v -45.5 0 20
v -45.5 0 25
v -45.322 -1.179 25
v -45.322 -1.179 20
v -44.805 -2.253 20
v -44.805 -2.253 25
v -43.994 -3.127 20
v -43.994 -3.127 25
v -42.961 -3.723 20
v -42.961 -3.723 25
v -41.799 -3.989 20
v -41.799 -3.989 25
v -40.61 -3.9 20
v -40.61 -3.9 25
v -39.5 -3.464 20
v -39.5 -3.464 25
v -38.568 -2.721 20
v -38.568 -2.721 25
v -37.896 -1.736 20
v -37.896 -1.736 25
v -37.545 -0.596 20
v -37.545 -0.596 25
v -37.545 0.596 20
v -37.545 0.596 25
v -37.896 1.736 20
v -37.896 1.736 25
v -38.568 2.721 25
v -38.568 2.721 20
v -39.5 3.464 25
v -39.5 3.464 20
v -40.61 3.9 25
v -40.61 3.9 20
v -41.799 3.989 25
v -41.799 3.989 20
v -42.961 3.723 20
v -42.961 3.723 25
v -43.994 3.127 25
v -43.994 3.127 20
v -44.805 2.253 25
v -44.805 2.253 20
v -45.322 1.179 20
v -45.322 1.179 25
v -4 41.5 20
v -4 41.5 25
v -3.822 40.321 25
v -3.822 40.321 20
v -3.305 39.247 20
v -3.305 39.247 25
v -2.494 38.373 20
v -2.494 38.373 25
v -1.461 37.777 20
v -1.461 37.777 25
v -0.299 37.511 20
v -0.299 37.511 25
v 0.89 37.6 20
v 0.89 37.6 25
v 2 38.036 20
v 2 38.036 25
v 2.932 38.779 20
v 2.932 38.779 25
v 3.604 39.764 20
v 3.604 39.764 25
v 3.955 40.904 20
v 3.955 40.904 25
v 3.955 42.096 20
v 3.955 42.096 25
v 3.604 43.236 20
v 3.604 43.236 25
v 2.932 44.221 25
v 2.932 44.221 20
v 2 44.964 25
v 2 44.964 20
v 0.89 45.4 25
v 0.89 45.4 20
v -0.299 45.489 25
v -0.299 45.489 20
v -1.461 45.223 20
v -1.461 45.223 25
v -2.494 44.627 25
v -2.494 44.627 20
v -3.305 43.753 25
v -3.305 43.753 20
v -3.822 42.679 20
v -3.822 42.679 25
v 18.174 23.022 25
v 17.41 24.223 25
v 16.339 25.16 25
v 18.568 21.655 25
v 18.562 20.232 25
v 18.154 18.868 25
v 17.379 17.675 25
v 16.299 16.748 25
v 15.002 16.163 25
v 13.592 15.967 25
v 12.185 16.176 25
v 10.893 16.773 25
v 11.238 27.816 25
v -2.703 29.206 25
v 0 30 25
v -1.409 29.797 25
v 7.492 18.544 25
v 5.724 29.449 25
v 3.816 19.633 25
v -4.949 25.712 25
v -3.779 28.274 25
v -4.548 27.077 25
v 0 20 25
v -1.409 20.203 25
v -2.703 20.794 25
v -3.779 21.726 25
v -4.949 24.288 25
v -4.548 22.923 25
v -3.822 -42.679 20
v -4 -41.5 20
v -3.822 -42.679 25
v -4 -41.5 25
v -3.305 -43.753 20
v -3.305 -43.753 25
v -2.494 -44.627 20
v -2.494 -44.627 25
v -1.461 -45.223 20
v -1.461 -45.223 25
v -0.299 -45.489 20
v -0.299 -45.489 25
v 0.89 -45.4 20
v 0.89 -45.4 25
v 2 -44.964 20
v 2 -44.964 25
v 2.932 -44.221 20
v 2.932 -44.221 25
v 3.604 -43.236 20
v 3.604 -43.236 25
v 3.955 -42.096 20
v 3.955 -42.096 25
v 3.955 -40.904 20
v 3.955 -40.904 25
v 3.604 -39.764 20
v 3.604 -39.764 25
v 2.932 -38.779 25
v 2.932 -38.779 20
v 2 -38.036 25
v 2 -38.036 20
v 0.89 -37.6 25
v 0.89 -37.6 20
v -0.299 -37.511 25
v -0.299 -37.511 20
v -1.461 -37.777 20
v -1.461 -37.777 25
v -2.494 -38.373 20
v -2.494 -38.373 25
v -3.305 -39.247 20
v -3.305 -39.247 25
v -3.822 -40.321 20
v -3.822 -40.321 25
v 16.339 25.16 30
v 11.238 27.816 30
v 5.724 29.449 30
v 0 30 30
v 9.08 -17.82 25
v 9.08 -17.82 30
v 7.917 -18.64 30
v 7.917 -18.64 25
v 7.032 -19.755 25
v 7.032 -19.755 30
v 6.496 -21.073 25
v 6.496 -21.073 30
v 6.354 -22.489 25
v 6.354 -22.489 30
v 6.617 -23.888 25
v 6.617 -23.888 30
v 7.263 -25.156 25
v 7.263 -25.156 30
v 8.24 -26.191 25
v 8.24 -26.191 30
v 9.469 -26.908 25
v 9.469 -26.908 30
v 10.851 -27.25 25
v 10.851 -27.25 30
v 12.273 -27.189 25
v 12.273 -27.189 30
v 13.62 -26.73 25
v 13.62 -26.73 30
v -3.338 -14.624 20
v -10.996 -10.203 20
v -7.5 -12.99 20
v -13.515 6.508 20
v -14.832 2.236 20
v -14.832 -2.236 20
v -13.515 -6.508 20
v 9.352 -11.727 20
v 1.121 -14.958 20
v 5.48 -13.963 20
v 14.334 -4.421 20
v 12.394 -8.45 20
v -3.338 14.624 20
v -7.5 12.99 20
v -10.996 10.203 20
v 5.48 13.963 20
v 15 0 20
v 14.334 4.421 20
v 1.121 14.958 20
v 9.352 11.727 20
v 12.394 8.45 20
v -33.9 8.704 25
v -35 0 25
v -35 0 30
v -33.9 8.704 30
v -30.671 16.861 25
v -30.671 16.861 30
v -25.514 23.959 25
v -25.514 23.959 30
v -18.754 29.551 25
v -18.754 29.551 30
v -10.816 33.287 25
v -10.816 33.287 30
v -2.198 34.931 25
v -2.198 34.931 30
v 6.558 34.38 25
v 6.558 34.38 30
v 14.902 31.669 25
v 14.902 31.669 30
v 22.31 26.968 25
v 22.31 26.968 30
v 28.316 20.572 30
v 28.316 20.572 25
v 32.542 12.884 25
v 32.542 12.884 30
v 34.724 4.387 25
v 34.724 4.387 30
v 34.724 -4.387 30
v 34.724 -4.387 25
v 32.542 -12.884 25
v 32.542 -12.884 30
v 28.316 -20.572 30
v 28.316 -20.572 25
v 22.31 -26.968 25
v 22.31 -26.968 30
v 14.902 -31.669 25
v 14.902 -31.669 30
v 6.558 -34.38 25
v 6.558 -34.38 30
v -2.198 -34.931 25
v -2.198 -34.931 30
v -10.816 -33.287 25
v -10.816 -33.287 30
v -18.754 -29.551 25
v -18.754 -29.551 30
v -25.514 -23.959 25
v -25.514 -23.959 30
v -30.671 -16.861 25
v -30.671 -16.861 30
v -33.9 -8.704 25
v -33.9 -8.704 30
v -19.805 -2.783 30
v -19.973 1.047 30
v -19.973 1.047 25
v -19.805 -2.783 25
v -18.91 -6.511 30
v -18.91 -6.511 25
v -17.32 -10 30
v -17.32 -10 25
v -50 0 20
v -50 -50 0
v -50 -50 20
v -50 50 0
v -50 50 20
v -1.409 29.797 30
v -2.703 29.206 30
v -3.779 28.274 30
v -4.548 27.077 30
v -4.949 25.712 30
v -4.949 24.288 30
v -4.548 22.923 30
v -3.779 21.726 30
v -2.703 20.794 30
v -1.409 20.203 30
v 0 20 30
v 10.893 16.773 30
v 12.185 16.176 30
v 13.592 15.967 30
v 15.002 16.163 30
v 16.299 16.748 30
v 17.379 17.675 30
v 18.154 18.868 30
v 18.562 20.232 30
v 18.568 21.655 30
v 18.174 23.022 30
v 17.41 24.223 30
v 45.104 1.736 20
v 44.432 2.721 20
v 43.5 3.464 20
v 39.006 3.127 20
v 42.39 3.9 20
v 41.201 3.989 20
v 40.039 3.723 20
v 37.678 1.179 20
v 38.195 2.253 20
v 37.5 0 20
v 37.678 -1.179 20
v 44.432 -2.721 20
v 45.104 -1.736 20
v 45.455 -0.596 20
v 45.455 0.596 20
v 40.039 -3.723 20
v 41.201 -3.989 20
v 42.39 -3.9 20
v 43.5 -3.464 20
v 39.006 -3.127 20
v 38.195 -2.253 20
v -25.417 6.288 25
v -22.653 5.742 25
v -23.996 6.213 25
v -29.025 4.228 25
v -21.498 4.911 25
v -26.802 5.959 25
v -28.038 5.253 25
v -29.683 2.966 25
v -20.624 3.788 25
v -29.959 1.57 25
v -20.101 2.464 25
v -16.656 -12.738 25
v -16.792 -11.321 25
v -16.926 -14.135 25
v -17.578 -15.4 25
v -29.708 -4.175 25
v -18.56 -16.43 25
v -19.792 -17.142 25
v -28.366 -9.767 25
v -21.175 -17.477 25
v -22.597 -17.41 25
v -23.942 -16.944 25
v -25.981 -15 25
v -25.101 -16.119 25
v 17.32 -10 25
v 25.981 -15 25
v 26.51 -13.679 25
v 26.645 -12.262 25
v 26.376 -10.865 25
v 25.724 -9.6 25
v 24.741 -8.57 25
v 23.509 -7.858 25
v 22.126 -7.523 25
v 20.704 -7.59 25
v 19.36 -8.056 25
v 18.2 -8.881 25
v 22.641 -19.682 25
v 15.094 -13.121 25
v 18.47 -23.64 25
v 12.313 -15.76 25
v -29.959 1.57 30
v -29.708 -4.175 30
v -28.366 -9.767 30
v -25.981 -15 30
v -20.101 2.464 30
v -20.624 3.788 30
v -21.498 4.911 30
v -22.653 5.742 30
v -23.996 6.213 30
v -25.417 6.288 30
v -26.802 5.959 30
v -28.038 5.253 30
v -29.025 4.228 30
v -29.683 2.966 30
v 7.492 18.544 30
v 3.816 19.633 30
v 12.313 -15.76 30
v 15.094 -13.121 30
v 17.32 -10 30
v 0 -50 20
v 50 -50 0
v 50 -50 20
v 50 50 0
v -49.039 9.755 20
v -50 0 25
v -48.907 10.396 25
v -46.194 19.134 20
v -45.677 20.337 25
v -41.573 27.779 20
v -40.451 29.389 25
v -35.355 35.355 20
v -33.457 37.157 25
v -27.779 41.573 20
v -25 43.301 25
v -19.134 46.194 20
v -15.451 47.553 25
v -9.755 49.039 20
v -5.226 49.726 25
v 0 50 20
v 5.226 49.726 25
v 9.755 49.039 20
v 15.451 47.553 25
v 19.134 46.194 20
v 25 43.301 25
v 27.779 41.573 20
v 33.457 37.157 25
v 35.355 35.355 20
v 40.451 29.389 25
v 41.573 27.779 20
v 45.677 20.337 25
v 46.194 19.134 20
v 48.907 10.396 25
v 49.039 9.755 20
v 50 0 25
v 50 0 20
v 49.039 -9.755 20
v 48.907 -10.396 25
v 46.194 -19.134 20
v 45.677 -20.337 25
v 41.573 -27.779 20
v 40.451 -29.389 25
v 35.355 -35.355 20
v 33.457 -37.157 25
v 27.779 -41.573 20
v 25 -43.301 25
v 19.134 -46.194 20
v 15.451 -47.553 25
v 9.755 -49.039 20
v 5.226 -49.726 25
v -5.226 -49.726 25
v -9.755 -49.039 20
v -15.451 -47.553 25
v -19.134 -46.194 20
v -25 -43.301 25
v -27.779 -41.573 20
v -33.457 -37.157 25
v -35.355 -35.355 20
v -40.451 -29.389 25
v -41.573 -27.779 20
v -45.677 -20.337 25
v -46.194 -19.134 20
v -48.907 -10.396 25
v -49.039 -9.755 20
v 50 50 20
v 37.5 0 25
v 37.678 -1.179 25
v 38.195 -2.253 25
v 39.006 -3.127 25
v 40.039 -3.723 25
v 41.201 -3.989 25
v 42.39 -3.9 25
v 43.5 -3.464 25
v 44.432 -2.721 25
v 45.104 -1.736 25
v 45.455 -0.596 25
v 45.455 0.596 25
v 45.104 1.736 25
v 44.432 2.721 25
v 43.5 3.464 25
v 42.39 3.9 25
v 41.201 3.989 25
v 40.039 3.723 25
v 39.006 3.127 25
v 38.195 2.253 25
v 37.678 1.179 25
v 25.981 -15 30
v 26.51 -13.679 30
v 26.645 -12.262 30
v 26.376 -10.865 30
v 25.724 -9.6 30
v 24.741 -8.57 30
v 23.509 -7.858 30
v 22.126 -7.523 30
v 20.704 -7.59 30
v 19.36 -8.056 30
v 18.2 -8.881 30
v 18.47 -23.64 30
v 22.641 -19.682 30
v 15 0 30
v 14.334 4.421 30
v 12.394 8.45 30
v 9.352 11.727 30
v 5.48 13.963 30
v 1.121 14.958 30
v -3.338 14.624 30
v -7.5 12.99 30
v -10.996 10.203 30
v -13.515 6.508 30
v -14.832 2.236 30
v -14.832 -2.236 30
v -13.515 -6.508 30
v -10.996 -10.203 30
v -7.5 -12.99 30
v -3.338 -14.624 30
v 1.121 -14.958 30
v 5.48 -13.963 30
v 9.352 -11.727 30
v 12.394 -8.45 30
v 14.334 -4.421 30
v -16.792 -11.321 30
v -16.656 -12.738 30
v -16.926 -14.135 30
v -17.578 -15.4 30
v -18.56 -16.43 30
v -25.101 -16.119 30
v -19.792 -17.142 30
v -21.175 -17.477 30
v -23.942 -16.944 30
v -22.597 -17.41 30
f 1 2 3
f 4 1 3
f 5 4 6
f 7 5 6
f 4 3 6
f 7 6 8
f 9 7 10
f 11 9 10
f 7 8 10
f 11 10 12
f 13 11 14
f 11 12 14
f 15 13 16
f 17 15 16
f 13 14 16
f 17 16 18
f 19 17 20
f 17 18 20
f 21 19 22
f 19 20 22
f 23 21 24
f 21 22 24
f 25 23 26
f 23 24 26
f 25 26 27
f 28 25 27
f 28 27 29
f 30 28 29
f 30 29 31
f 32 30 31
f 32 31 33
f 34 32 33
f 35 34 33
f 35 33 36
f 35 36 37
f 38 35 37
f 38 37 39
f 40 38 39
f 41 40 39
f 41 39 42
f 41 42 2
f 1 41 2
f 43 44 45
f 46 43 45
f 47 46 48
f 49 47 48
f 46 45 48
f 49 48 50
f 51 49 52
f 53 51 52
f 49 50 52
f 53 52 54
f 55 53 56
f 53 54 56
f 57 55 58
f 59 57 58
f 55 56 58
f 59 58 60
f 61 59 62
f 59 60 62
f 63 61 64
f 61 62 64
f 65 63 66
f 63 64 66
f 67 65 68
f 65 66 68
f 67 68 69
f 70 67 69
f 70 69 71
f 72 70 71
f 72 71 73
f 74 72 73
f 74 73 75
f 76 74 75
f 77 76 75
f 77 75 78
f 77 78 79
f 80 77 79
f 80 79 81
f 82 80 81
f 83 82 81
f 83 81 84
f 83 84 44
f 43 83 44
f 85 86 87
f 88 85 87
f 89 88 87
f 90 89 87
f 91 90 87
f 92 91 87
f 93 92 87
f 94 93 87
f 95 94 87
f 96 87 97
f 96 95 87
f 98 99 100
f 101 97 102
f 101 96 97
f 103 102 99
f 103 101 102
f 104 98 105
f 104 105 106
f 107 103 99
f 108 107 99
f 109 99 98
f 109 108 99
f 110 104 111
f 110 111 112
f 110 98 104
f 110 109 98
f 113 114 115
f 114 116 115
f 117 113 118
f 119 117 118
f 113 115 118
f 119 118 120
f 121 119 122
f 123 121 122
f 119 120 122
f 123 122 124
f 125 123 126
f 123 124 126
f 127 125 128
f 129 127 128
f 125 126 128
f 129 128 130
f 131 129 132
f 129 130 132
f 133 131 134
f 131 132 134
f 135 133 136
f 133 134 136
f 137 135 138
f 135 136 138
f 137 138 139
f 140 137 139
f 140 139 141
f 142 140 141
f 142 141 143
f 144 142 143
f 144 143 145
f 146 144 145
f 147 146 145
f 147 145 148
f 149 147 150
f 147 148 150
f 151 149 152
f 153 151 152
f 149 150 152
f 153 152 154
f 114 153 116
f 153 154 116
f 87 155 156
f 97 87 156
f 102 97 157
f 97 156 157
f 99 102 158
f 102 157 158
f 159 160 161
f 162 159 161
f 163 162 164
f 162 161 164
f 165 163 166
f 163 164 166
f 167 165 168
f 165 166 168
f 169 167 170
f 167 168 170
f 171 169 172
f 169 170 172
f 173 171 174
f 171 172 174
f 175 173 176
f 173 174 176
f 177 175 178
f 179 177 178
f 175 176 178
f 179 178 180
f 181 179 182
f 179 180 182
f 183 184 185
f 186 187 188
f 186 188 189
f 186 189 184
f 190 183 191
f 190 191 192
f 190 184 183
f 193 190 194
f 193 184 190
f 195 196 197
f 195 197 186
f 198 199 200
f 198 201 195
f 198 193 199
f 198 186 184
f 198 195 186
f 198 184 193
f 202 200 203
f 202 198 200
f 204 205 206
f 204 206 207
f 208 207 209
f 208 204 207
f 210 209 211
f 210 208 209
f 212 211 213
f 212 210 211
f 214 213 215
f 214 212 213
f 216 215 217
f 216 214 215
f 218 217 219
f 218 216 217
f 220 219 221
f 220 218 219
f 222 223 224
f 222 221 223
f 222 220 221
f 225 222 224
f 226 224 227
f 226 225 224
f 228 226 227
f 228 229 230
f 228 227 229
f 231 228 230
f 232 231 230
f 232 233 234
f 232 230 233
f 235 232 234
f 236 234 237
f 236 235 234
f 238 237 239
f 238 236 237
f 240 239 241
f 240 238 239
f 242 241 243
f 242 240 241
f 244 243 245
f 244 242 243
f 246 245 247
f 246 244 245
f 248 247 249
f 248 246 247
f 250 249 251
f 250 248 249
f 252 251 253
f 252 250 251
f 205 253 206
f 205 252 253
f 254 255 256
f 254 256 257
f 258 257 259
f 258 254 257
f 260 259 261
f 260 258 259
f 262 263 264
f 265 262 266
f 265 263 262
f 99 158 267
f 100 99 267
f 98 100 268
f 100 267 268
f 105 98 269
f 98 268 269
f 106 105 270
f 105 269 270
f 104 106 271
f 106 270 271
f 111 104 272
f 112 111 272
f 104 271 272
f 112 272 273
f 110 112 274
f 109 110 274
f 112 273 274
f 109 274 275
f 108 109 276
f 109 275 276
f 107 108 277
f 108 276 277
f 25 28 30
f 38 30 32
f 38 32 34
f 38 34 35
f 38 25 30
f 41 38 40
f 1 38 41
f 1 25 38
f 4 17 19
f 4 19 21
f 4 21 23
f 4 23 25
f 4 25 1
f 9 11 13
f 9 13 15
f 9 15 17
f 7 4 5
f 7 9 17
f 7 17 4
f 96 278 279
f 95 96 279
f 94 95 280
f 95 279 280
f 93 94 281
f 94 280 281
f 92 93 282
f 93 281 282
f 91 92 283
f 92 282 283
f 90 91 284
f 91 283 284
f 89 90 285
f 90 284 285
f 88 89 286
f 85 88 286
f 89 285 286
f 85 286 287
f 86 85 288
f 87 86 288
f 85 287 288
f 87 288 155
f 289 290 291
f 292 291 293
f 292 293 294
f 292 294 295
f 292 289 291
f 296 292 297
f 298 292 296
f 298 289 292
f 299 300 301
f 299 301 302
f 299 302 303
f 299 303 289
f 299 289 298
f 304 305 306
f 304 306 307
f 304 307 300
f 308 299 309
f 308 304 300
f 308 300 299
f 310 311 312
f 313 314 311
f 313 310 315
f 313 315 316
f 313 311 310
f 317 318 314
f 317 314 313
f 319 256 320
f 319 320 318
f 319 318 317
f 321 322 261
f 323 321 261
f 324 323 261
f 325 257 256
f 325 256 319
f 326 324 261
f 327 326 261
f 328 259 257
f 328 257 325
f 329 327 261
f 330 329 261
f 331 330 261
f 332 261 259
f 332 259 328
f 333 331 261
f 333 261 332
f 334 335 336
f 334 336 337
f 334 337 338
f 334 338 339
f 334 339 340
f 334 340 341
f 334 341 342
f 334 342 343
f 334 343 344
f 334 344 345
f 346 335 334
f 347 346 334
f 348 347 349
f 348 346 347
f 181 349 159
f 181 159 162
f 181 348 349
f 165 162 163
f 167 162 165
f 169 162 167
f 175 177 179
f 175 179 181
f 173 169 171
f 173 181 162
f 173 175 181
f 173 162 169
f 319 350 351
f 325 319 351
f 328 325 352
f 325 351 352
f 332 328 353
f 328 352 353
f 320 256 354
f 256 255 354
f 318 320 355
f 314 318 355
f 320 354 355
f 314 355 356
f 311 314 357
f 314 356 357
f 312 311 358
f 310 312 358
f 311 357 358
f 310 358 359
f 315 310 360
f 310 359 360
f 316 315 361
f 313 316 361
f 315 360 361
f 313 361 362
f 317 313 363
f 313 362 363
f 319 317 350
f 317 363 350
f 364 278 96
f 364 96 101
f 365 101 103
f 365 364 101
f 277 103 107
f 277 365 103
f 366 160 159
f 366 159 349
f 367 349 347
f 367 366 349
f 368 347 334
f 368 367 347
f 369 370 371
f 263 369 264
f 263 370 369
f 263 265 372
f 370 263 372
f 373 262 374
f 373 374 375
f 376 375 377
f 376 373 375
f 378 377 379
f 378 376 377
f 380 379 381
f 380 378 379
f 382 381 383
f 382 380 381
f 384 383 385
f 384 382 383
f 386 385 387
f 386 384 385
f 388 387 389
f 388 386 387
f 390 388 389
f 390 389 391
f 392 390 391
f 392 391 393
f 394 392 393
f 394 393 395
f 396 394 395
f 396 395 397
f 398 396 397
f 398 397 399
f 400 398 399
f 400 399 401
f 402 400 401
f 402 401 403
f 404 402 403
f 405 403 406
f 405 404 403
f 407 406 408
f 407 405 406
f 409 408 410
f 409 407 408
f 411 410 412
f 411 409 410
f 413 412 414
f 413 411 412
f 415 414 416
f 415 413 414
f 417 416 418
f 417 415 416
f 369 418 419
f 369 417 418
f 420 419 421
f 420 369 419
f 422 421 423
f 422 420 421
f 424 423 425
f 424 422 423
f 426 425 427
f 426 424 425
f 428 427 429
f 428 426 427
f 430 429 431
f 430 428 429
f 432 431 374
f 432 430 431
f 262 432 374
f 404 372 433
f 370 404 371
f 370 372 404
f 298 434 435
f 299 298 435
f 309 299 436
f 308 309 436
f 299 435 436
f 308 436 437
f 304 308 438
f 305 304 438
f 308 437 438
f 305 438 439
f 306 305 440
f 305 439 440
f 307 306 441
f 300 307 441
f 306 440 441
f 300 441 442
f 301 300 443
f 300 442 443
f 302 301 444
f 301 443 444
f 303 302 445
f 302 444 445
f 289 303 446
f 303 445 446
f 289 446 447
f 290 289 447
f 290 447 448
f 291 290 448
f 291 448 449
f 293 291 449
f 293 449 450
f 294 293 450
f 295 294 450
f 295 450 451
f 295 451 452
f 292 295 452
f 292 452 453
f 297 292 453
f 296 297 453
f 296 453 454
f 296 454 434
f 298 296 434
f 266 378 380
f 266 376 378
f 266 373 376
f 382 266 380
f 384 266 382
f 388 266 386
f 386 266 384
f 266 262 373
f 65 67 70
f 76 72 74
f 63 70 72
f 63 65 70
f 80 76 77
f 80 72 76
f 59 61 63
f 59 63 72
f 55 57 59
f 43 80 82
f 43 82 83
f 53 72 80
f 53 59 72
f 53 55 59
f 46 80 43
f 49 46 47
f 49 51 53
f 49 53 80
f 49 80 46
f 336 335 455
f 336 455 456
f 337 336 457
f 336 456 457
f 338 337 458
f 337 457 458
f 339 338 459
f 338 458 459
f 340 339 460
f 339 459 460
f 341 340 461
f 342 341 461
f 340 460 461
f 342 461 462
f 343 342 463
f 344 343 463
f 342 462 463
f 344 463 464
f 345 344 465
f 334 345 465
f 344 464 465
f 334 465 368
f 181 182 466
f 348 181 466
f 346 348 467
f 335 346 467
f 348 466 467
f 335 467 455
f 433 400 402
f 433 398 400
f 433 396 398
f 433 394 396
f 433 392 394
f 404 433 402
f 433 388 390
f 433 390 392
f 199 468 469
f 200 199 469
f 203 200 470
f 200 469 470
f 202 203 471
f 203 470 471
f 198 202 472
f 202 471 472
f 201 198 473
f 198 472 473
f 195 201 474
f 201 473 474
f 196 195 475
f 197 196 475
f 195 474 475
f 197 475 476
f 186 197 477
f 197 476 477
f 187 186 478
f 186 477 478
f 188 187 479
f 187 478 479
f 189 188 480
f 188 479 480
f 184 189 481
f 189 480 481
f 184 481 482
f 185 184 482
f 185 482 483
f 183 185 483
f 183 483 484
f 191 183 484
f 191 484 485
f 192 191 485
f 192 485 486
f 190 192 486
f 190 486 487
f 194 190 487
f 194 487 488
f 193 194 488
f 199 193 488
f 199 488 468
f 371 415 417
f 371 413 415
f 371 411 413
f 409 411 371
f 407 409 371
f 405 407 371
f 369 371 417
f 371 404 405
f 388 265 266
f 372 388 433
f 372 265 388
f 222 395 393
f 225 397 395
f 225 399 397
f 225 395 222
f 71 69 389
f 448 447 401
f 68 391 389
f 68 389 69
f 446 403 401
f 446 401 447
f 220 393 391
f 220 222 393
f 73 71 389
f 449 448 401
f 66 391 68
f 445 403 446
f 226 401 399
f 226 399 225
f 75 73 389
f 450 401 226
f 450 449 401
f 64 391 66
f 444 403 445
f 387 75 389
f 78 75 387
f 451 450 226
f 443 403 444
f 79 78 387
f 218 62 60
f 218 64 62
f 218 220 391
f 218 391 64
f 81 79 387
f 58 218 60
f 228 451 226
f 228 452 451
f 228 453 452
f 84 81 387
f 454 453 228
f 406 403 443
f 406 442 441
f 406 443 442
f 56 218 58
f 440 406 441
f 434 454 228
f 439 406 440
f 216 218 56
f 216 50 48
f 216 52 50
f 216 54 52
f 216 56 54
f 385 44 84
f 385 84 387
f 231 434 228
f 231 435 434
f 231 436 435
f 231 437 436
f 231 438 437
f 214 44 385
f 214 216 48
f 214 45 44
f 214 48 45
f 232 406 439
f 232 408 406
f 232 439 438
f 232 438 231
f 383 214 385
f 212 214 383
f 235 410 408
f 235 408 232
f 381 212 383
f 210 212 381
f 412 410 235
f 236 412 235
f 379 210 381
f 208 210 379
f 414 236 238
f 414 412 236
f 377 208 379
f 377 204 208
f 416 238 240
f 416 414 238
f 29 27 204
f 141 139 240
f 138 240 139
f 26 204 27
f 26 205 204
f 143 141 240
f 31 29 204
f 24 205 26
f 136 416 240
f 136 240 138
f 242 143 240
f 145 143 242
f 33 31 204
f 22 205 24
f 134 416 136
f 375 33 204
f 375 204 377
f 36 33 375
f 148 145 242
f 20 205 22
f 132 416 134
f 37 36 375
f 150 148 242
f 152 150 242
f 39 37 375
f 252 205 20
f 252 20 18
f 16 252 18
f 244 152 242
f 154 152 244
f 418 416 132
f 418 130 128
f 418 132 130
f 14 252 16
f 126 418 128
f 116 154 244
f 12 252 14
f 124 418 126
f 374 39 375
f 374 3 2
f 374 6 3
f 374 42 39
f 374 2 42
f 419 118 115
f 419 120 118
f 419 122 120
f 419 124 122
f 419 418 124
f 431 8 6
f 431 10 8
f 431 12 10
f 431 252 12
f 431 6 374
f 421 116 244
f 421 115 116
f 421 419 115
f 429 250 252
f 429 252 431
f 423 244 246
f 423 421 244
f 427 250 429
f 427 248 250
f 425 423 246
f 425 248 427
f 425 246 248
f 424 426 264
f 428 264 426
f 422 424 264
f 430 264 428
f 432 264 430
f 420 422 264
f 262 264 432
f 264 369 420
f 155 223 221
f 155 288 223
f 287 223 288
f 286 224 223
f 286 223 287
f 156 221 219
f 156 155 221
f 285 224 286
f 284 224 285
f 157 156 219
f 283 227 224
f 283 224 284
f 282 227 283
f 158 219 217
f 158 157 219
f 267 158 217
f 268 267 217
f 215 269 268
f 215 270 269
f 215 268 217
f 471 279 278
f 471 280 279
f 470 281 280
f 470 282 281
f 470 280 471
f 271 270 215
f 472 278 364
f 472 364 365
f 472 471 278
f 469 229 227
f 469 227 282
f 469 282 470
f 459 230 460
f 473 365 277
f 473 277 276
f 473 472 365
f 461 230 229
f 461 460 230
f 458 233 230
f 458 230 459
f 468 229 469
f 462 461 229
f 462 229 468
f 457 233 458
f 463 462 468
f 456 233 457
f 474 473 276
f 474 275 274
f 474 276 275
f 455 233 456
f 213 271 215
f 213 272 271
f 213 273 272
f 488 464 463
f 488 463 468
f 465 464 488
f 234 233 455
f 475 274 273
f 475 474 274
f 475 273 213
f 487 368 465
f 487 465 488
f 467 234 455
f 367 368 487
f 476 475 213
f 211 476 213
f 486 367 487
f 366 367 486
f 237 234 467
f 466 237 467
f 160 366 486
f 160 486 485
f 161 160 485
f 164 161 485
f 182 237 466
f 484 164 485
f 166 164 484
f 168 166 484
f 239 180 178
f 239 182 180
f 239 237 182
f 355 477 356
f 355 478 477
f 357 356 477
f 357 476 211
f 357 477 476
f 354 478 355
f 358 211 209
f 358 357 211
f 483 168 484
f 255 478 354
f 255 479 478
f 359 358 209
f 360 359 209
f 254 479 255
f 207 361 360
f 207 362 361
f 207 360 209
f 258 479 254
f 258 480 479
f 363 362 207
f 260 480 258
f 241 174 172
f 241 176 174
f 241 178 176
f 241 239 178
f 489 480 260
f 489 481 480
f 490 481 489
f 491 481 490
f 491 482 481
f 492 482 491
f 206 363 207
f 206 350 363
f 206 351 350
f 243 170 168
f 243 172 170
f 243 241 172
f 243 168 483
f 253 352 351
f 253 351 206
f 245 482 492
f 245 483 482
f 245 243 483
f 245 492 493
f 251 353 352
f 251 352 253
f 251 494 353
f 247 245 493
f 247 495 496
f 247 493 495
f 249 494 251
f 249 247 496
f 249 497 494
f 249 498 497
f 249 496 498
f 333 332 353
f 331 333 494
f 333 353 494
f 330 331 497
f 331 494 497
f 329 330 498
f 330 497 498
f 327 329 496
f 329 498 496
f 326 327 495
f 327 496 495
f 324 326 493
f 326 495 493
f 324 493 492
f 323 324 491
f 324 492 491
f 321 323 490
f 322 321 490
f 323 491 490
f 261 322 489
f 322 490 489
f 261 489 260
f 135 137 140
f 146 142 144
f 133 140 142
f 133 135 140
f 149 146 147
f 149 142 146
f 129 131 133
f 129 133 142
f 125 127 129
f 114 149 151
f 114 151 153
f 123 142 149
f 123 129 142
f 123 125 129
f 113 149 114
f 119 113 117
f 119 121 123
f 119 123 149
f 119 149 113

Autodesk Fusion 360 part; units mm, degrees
sketch "Sketch1" plane through (0, 0, 0) normal (0, 0, 1) x (1, 0, 0)
  line L0 (50, -50) -> (-50, -50)
  line L1 (-50, -50) -> (-50, 50)
  line L2 (-50, 50) -> (50, 50)
  line L3 (50, 50) -> (50, -50)
  line L4 (50, -50) -> (-50, 50) construction
  line L5 (-50, -50) -> (50, 50) construction
  dimension "d1" = 100
  dimension "d2" = 100
extrude "Extrude1" add sketch "Sketch1" along normal blind 20
sketch "Sketch2" plane through (0, 0, 20) normal (0, 0, 1) x (-1, 0, 0)
  line L0 (-50, -50) -> (50, -50)
  line L1 (50, -50) -> (50, 50)
  line L2 (50, 50) -> (-50, 50)
  line L3 (-50, 50) -> (-50, -50)
  circle A0 centre (0, 0) radius 50
extrude "Extrude2" add sketch "Sketch2" along normal blind 5 contours A0
sketch "Sketch3" plane through (0, 0, 25) normal (0, 0, 1) x (-1, 0, 0)
  circle A0 centre (0, 0) radius 50
  circle A1 centre (0, 0) radius 35
  dimension "d7" = 70
extrude "Extrude3" add sketch "Sketch3" along normal blind 5 contours A1
sketch "Sketch4" plane through (0, 0, 30) normal (0, 0, 1) x (-1, 0, 0)
  circle A0 centre (0, 0) radius 35
  circle A1 centre (0, 0) radius 25 construction
  arc A2 (0, -30) -> (0, -20) centre (0, -25) ccw
  arc A3 (-10.8928, -16.7734) -> (-16.3392, -25.1601) centre (-13.616, -20.9668) ccw
  arc A4 (-10.8928, -16.7734) -> (0, -20) centre (0, 0) ccw
  arc A5 (-16.3392, -25.1601) -> (0, -30) centre (0, 0) ccw
  arc A6 (25.9808, 15) -> (17.3205, 10) centre (21.6506, 12.5) ccw
  arc A7 (19.9726, -1.0467) -> (29.9589, -1.5701) centre (24.9657, -1.3084) ccw
  arc A8 (19.9726, -1.0467) -> (17.3205, 10) centre (0, 0) ccw
  arc A9 (29.9589, -1.5701) -> (25.9808, 15) centre (0, 0) ccw
  arc A10 (-25.9808, 15) -> (-17.3205, 10) centre (-21.6506, 12.5) ccw
  arc A11 (-9.0798, 17.8201) -> (-13.6197, 26.7302) centre (-11.3498, 22.2752) ccw
  arc A12 (-9.0798, 17.8201) -> (-17.3205, 10) centre (0, 0) ccw
  arc A13 (-13.6197, 26.7302) -> (-25.9808, 15) centre (0, 0) ccw
  dimension "d11" = 40
  dimension "d12" = 60
  dimension "d13" = 50
  dimension "d16" = 360
extrude "Extrude4" cut sketch "Sketch4" against normal blind 5 contours A2 A3 A4 A5 | A6 A7 A8 A9 | A10 A11 A12 A13
sketch "Sketch5" plane through (0, 0, 30) normal (0, 0, 1) x (-1, 0, 0)
  arc A0 (-13.6197, 26.7302) -> (-25.9808, 15) centre (0, 0) ccw
  arc A1 (-9.0798, 17.8201) -> (-13.6197, 26.7302) centre (-11.3498, 22.2752) ccw
  arc A2 (-9.0798, 17.8201) -> (-17.3205, 10) centre (0, 0) ccw
  arc A3 (-25.9808, 15) -> (-17.3205, 10) centre (-21.6506, 12.5) ccw
  arc A4 (-16.3392, -25.1601) -> (0, -30) centre (0, 0) ccw
  arc A5 (-10.8928, -16.7734) -> (-16.3392, -25.1601) centre (-13.616, -20.9668) ccw
  arc A6 (-10.8928, -16.7734) -> (0, -20) centre (0, 0) ccw
  arc A7 (0, -30) -> (0, -20) centre (0, -25) ccw
  arc A8 (29.9589, -1.5701) -> (25.9808, 15) centre (0, 0) ccw
  arc A9 (19.9726, -1.0467) -> (29.9589, -1.5701) centre (24.9657, -1.3084) ccw
  arc A10 (19.9726, -1.0467) -> (17.3205, 10) centre (0, 0) ccw
  arc A11 (25.9808, 15) -> (17.3205, 10) centre (21.6506, 12.5) ccw
  circle A12 centre (0, 0) radius 35
sketch "Sketch6" plane through (0, 0, 30) normal (0, 0, 1) x (1, 0, 0)
  circle A0 centre (0, 0) radius 15
  dimension "d19" = 30
extrude "Extrude5" cut sketch "Sketch6" against normal blind 10
sketch "Sketch7" plane through (0, 0, 25) normal (0, 0, 1) x (-1, 0, 0)
  circle A0 centre (0, 0) radius 35
  circle A1 centre (0, 0) radius 50
  circle A2 centre (0, 0) radius 41.5 construction
  line L0 (0, 0) -> (50, 0) construction
  circle A3 centre (41.5, 0) radius 4
  circle A4 centre (0, 41.5) radius 4
  circle A5 centre (-41.5, 0) radius 4
  circle A6 centre (0, -41.5) radius 4
  dimension "d22" = 83
  dimension "d23" = 8
  dimension "d25" = 360
extrude "Extrude6" cut sketch "Sketch7" against normal blind 5 contours A3 | A4 | A5 | A6
